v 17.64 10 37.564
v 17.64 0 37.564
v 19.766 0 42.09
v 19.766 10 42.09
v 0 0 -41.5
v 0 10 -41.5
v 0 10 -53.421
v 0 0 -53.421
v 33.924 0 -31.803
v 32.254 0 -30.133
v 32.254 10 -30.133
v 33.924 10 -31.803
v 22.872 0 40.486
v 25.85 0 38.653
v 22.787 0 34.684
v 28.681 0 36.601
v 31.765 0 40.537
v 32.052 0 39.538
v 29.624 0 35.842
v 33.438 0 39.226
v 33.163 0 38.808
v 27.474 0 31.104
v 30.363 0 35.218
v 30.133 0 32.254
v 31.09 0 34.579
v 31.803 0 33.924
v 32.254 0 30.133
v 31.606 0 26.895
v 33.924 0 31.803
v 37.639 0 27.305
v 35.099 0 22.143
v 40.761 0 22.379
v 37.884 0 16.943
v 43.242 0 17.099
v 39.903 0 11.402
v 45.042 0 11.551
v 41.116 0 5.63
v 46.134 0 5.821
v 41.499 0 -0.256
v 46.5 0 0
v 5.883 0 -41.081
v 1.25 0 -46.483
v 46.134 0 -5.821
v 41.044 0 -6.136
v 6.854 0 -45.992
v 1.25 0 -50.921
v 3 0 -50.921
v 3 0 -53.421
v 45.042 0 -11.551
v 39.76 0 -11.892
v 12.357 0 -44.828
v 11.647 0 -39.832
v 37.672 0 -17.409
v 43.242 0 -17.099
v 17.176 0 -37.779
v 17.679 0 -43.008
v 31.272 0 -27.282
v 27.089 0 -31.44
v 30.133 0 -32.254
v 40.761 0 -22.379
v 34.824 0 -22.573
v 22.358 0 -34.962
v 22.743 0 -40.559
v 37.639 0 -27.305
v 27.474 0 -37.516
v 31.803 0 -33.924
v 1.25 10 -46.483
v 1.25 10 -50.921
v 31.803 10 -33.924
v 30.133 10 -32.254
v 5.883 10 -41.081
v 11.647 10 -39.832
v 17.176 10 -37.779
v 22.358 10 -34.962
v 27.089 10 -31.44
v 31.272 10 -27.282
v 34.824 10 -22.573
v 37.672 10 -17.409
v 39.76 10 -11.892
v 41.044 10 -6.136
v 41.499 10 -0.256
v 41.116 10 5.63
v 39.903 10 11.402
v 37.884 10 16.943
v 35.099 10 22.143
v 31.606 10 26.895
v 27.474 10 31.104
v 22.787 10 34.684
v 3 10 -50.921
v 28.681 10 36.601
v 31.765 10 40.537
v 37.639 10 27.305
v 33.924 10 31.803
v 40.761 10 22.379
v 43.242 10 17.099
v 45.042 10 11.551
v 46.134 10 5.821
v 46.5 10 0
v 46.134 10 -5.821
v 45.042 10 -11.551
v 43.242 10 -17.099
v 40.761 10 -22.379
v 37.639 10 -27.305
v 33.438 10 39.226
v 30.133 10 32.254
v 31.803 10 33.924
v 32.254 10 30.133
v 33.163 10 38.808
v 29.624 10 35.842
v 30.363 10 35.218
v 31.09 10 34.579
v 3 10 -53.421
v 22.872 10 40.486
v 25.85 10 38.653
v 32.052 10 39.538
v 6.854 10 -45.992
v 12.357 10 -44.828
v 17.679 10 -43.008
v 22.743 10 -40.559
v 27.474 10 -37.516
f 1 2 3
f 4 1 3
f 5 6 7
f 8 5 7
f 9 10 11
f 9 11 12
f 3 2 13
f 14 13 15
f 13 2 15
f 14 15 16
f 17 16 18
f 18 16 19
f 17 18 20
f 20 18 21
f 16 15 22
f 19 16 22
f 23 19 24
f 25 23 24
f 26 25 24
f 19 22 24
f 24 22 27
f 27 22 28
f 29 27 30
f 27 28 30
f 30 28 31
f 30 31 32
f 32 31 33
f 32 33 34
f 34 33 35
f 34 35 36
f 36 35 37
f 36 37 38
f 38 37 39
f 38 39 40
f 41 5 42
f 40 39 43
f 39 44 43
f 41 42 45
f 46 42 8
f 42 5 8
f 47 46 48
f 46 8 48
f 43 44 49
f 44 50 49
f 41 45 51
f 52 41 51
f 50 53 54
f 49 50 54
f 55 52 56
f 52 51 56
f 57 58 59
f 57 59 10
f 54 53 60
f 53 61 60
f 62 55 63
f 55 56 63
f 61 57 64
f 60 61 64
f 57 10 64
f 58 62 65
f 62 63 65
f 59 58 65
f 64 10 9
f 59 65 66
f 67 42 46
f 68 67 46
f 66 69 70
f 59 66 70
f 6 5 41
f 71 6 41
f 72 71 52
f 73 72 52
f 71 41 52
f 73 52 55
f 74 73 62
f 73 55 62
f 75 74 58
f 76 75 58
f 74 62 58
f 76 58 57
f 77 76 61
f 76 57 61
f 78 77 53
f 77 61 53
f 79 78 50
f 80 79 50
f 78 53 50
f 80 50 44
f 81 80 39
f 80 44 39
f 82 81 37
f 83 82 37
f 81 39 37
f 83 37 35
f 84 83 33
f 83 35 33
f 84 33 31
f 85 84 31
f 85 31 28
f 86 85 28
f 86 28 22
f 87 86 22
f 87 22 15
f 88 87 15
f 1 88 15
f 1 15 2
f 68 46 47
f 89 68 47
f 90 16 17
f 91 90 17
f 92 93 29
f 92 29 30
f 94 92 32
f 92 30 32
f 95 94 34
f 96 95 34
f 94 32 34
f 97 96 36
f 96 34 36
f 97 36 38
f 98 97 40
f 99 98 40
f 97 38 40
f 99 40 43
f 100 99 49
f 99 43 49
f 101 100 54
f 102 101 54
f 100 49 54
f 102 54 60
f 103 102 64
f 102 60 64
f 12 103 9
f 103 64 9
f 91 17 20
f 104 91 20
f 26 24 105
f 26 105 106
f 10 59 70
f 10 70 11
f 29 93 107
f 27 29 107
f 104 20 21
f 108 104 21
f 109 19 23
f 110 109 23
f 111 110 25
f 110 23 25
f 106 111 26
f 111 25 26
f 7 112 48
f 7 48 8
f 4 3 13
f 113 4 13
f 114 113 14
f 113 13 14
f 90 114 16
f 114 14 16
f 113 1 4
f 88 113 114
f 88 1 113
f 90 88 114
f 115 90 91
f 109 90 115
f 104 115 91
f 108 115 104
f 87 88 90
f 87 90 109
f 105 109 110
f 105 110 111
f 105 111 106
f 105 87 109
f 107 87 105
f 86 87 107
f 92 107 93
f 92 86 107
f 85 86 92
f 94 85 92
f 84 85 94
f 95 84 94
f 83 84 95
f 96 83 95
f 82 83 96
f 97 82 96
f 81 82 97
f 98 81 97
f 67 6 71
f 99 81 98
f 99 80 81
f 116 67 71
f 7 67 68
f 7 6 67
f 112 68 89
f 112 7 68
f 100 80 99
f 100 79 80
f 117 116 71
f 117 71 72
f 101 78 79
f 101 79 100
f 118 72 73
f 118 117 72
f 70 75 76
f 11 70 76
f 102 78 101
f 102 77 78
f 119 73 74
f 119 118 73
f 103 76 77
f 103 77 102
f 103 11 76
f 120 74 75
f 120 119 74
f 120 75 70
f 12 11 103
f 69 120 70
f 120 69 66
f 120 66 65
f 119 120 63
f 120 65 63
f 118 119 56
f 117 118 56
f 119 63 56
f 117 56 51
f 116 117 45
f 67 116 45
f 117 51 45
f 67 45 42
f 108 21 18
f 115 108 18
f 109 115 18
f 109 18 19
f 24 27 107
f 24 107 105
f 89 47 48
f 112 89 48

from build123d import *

# Parameters (mm, degrees)
BOSS_EXTRUDE1_DEPTH     = 10
EXTRUDE_THIN1_DEPTH     = 10
CUT_EXTRUDE_THIN2_DEPTH = 10
BOSS_EXTRUDE2_DEPTH     = 10


# Read off the part's stored shape, not the designer's step: Extrude-Thin1
with BuildPart() as part:
    # Sketch1 → Boss-Extrude1 (new body)
    with BuildSketch(Plane(origin=(0, 0, 0), x_dir=(1, 0, 0), z_dir=(0, 1, 0))):
        with BuildLine():
            ThreePointArc((-17.640256265, -37.564229779), (0, 41.5), (17.640256265, -37.564229779))
            Line((17.640256265, -37.564229779), (19.765588345, -42.090040596))
            ThreePointArc((19.765588345, -42.090040596), (24.378319794, -39.597317132), (28.681103985, -36.601151269))
            Line((28.681103985, -36.601151269), (29.481767388, -35.626435952))
            Line((29.481767388, -35.626435952), (29.623728376, -35.842498756))
            ThreePointArc((29.623728376, -35.842498756), (-5.835552757, 46.132378261), (-19.765588345, -42.090040596))
            Line((-19.765588345, -42.090040596), (-17.640256265, -37.564229779))
        make_face()
    extrude(amount=BOSS_EXTRUDE1_DEPTH)

    # Extrude-Thin1 outline → Extrude-Thin1 (add)
    with BuildSketch(Plane(origin=(0, 0, 0), x_dir=(1, 0, 0), z_dir=(0, 1, 0))):
        with BuildLine():
            Line((-3, 50.921232979), (-1.25, 50.921232979))
            Line((-1.25, 50.921232979), (-1.25, 46.483195888))
            ThreePointArc((-1.25, 46.483195888), (0, 46.5), (1.25, 46.483195888))
            Line((1.25, 46.483195888), (1.25, 50.921232979))
            Line((1.25, 50.921232979), (3, 50.921232979))
            Line((3, 50.921232979), (3, 53.421232979))
            Line((3, 53.421232979), (-3, 53.421232979))
            Line((-3, 53.421232979), (-3, 50.921232979))
        make_face()
    extrude(amount=EXTRUDE_THIN1_DEPTH)

    # SurfaceCut1
    split(bisect_by=Plane(origin=(0, 0, 0), x_dir=(0, 0, -1), z_dir=(1, 0, 0)), keep=Keep.TOP)

    # Sketch3 → Cut-Extrude-Thin2 (cut)
    with BuildSketch(Plane(origin=(0, 0, 0), x_dir=(1, 0, 0), z_dir=(0, 1, 0))):
        Polygon((32.254075142, 30.132754798), (35.916621941, 33.795301597), (33.795301597, 35.916621941), (30.132754798, 32.254075142), align=None)
        Polygon((30.132754798, -32.254075142), (33.795301597, -35.916621941), (35.916621941, -33.795301597), (32.254075142, -30.132754798), align=None)
    extrude(amount=CUT_EXTRUDE_THIN2_DEPTH, mode=Mode.SUBTRACT)

    # Sketch1<6> → Boss-Extrude2 (add)
    with BuildSketch(Plane(origin=(0, 0, 0), x_dir=(1, 0, 0), z_dir=(0, 1, 0))):
        with BuildLine():
            Line((32.051958284, -39.538233554), (29.623728376, -35.842498756))
            ThreePointArc((29.623728376, -35.842498756), (29.15488394, -36.2248912), (28.681103985, -36.601151269))
            Line((28.681103985, -36.601151269), (31.765093661, -40.536758932))
            Line((31.765093661, -40.536758932), (33.437562335, -39.226192289))
            Line((33.437562335, -39.226192289), (33.162966722, -38.808261285))
            Line((33.162966722, -38.808261285), (32.051958284, -39.538233554))
        make_face()
        with BuildLine():
            ThreePointArc((28.681103985, -36.601151269), (29.15488394, -36.2248912), (29.623728376, -35.842498756))
            Line((29.623728376, -35.842498756), (29.481767388, -35.626435952))
            Line((29.481767388, -35.626435952), (28.681103985, -36.601151269))
        make_face()
    extrude(amount=BOSS_EXTRUDE2_DEPTH)


solid = part.part
